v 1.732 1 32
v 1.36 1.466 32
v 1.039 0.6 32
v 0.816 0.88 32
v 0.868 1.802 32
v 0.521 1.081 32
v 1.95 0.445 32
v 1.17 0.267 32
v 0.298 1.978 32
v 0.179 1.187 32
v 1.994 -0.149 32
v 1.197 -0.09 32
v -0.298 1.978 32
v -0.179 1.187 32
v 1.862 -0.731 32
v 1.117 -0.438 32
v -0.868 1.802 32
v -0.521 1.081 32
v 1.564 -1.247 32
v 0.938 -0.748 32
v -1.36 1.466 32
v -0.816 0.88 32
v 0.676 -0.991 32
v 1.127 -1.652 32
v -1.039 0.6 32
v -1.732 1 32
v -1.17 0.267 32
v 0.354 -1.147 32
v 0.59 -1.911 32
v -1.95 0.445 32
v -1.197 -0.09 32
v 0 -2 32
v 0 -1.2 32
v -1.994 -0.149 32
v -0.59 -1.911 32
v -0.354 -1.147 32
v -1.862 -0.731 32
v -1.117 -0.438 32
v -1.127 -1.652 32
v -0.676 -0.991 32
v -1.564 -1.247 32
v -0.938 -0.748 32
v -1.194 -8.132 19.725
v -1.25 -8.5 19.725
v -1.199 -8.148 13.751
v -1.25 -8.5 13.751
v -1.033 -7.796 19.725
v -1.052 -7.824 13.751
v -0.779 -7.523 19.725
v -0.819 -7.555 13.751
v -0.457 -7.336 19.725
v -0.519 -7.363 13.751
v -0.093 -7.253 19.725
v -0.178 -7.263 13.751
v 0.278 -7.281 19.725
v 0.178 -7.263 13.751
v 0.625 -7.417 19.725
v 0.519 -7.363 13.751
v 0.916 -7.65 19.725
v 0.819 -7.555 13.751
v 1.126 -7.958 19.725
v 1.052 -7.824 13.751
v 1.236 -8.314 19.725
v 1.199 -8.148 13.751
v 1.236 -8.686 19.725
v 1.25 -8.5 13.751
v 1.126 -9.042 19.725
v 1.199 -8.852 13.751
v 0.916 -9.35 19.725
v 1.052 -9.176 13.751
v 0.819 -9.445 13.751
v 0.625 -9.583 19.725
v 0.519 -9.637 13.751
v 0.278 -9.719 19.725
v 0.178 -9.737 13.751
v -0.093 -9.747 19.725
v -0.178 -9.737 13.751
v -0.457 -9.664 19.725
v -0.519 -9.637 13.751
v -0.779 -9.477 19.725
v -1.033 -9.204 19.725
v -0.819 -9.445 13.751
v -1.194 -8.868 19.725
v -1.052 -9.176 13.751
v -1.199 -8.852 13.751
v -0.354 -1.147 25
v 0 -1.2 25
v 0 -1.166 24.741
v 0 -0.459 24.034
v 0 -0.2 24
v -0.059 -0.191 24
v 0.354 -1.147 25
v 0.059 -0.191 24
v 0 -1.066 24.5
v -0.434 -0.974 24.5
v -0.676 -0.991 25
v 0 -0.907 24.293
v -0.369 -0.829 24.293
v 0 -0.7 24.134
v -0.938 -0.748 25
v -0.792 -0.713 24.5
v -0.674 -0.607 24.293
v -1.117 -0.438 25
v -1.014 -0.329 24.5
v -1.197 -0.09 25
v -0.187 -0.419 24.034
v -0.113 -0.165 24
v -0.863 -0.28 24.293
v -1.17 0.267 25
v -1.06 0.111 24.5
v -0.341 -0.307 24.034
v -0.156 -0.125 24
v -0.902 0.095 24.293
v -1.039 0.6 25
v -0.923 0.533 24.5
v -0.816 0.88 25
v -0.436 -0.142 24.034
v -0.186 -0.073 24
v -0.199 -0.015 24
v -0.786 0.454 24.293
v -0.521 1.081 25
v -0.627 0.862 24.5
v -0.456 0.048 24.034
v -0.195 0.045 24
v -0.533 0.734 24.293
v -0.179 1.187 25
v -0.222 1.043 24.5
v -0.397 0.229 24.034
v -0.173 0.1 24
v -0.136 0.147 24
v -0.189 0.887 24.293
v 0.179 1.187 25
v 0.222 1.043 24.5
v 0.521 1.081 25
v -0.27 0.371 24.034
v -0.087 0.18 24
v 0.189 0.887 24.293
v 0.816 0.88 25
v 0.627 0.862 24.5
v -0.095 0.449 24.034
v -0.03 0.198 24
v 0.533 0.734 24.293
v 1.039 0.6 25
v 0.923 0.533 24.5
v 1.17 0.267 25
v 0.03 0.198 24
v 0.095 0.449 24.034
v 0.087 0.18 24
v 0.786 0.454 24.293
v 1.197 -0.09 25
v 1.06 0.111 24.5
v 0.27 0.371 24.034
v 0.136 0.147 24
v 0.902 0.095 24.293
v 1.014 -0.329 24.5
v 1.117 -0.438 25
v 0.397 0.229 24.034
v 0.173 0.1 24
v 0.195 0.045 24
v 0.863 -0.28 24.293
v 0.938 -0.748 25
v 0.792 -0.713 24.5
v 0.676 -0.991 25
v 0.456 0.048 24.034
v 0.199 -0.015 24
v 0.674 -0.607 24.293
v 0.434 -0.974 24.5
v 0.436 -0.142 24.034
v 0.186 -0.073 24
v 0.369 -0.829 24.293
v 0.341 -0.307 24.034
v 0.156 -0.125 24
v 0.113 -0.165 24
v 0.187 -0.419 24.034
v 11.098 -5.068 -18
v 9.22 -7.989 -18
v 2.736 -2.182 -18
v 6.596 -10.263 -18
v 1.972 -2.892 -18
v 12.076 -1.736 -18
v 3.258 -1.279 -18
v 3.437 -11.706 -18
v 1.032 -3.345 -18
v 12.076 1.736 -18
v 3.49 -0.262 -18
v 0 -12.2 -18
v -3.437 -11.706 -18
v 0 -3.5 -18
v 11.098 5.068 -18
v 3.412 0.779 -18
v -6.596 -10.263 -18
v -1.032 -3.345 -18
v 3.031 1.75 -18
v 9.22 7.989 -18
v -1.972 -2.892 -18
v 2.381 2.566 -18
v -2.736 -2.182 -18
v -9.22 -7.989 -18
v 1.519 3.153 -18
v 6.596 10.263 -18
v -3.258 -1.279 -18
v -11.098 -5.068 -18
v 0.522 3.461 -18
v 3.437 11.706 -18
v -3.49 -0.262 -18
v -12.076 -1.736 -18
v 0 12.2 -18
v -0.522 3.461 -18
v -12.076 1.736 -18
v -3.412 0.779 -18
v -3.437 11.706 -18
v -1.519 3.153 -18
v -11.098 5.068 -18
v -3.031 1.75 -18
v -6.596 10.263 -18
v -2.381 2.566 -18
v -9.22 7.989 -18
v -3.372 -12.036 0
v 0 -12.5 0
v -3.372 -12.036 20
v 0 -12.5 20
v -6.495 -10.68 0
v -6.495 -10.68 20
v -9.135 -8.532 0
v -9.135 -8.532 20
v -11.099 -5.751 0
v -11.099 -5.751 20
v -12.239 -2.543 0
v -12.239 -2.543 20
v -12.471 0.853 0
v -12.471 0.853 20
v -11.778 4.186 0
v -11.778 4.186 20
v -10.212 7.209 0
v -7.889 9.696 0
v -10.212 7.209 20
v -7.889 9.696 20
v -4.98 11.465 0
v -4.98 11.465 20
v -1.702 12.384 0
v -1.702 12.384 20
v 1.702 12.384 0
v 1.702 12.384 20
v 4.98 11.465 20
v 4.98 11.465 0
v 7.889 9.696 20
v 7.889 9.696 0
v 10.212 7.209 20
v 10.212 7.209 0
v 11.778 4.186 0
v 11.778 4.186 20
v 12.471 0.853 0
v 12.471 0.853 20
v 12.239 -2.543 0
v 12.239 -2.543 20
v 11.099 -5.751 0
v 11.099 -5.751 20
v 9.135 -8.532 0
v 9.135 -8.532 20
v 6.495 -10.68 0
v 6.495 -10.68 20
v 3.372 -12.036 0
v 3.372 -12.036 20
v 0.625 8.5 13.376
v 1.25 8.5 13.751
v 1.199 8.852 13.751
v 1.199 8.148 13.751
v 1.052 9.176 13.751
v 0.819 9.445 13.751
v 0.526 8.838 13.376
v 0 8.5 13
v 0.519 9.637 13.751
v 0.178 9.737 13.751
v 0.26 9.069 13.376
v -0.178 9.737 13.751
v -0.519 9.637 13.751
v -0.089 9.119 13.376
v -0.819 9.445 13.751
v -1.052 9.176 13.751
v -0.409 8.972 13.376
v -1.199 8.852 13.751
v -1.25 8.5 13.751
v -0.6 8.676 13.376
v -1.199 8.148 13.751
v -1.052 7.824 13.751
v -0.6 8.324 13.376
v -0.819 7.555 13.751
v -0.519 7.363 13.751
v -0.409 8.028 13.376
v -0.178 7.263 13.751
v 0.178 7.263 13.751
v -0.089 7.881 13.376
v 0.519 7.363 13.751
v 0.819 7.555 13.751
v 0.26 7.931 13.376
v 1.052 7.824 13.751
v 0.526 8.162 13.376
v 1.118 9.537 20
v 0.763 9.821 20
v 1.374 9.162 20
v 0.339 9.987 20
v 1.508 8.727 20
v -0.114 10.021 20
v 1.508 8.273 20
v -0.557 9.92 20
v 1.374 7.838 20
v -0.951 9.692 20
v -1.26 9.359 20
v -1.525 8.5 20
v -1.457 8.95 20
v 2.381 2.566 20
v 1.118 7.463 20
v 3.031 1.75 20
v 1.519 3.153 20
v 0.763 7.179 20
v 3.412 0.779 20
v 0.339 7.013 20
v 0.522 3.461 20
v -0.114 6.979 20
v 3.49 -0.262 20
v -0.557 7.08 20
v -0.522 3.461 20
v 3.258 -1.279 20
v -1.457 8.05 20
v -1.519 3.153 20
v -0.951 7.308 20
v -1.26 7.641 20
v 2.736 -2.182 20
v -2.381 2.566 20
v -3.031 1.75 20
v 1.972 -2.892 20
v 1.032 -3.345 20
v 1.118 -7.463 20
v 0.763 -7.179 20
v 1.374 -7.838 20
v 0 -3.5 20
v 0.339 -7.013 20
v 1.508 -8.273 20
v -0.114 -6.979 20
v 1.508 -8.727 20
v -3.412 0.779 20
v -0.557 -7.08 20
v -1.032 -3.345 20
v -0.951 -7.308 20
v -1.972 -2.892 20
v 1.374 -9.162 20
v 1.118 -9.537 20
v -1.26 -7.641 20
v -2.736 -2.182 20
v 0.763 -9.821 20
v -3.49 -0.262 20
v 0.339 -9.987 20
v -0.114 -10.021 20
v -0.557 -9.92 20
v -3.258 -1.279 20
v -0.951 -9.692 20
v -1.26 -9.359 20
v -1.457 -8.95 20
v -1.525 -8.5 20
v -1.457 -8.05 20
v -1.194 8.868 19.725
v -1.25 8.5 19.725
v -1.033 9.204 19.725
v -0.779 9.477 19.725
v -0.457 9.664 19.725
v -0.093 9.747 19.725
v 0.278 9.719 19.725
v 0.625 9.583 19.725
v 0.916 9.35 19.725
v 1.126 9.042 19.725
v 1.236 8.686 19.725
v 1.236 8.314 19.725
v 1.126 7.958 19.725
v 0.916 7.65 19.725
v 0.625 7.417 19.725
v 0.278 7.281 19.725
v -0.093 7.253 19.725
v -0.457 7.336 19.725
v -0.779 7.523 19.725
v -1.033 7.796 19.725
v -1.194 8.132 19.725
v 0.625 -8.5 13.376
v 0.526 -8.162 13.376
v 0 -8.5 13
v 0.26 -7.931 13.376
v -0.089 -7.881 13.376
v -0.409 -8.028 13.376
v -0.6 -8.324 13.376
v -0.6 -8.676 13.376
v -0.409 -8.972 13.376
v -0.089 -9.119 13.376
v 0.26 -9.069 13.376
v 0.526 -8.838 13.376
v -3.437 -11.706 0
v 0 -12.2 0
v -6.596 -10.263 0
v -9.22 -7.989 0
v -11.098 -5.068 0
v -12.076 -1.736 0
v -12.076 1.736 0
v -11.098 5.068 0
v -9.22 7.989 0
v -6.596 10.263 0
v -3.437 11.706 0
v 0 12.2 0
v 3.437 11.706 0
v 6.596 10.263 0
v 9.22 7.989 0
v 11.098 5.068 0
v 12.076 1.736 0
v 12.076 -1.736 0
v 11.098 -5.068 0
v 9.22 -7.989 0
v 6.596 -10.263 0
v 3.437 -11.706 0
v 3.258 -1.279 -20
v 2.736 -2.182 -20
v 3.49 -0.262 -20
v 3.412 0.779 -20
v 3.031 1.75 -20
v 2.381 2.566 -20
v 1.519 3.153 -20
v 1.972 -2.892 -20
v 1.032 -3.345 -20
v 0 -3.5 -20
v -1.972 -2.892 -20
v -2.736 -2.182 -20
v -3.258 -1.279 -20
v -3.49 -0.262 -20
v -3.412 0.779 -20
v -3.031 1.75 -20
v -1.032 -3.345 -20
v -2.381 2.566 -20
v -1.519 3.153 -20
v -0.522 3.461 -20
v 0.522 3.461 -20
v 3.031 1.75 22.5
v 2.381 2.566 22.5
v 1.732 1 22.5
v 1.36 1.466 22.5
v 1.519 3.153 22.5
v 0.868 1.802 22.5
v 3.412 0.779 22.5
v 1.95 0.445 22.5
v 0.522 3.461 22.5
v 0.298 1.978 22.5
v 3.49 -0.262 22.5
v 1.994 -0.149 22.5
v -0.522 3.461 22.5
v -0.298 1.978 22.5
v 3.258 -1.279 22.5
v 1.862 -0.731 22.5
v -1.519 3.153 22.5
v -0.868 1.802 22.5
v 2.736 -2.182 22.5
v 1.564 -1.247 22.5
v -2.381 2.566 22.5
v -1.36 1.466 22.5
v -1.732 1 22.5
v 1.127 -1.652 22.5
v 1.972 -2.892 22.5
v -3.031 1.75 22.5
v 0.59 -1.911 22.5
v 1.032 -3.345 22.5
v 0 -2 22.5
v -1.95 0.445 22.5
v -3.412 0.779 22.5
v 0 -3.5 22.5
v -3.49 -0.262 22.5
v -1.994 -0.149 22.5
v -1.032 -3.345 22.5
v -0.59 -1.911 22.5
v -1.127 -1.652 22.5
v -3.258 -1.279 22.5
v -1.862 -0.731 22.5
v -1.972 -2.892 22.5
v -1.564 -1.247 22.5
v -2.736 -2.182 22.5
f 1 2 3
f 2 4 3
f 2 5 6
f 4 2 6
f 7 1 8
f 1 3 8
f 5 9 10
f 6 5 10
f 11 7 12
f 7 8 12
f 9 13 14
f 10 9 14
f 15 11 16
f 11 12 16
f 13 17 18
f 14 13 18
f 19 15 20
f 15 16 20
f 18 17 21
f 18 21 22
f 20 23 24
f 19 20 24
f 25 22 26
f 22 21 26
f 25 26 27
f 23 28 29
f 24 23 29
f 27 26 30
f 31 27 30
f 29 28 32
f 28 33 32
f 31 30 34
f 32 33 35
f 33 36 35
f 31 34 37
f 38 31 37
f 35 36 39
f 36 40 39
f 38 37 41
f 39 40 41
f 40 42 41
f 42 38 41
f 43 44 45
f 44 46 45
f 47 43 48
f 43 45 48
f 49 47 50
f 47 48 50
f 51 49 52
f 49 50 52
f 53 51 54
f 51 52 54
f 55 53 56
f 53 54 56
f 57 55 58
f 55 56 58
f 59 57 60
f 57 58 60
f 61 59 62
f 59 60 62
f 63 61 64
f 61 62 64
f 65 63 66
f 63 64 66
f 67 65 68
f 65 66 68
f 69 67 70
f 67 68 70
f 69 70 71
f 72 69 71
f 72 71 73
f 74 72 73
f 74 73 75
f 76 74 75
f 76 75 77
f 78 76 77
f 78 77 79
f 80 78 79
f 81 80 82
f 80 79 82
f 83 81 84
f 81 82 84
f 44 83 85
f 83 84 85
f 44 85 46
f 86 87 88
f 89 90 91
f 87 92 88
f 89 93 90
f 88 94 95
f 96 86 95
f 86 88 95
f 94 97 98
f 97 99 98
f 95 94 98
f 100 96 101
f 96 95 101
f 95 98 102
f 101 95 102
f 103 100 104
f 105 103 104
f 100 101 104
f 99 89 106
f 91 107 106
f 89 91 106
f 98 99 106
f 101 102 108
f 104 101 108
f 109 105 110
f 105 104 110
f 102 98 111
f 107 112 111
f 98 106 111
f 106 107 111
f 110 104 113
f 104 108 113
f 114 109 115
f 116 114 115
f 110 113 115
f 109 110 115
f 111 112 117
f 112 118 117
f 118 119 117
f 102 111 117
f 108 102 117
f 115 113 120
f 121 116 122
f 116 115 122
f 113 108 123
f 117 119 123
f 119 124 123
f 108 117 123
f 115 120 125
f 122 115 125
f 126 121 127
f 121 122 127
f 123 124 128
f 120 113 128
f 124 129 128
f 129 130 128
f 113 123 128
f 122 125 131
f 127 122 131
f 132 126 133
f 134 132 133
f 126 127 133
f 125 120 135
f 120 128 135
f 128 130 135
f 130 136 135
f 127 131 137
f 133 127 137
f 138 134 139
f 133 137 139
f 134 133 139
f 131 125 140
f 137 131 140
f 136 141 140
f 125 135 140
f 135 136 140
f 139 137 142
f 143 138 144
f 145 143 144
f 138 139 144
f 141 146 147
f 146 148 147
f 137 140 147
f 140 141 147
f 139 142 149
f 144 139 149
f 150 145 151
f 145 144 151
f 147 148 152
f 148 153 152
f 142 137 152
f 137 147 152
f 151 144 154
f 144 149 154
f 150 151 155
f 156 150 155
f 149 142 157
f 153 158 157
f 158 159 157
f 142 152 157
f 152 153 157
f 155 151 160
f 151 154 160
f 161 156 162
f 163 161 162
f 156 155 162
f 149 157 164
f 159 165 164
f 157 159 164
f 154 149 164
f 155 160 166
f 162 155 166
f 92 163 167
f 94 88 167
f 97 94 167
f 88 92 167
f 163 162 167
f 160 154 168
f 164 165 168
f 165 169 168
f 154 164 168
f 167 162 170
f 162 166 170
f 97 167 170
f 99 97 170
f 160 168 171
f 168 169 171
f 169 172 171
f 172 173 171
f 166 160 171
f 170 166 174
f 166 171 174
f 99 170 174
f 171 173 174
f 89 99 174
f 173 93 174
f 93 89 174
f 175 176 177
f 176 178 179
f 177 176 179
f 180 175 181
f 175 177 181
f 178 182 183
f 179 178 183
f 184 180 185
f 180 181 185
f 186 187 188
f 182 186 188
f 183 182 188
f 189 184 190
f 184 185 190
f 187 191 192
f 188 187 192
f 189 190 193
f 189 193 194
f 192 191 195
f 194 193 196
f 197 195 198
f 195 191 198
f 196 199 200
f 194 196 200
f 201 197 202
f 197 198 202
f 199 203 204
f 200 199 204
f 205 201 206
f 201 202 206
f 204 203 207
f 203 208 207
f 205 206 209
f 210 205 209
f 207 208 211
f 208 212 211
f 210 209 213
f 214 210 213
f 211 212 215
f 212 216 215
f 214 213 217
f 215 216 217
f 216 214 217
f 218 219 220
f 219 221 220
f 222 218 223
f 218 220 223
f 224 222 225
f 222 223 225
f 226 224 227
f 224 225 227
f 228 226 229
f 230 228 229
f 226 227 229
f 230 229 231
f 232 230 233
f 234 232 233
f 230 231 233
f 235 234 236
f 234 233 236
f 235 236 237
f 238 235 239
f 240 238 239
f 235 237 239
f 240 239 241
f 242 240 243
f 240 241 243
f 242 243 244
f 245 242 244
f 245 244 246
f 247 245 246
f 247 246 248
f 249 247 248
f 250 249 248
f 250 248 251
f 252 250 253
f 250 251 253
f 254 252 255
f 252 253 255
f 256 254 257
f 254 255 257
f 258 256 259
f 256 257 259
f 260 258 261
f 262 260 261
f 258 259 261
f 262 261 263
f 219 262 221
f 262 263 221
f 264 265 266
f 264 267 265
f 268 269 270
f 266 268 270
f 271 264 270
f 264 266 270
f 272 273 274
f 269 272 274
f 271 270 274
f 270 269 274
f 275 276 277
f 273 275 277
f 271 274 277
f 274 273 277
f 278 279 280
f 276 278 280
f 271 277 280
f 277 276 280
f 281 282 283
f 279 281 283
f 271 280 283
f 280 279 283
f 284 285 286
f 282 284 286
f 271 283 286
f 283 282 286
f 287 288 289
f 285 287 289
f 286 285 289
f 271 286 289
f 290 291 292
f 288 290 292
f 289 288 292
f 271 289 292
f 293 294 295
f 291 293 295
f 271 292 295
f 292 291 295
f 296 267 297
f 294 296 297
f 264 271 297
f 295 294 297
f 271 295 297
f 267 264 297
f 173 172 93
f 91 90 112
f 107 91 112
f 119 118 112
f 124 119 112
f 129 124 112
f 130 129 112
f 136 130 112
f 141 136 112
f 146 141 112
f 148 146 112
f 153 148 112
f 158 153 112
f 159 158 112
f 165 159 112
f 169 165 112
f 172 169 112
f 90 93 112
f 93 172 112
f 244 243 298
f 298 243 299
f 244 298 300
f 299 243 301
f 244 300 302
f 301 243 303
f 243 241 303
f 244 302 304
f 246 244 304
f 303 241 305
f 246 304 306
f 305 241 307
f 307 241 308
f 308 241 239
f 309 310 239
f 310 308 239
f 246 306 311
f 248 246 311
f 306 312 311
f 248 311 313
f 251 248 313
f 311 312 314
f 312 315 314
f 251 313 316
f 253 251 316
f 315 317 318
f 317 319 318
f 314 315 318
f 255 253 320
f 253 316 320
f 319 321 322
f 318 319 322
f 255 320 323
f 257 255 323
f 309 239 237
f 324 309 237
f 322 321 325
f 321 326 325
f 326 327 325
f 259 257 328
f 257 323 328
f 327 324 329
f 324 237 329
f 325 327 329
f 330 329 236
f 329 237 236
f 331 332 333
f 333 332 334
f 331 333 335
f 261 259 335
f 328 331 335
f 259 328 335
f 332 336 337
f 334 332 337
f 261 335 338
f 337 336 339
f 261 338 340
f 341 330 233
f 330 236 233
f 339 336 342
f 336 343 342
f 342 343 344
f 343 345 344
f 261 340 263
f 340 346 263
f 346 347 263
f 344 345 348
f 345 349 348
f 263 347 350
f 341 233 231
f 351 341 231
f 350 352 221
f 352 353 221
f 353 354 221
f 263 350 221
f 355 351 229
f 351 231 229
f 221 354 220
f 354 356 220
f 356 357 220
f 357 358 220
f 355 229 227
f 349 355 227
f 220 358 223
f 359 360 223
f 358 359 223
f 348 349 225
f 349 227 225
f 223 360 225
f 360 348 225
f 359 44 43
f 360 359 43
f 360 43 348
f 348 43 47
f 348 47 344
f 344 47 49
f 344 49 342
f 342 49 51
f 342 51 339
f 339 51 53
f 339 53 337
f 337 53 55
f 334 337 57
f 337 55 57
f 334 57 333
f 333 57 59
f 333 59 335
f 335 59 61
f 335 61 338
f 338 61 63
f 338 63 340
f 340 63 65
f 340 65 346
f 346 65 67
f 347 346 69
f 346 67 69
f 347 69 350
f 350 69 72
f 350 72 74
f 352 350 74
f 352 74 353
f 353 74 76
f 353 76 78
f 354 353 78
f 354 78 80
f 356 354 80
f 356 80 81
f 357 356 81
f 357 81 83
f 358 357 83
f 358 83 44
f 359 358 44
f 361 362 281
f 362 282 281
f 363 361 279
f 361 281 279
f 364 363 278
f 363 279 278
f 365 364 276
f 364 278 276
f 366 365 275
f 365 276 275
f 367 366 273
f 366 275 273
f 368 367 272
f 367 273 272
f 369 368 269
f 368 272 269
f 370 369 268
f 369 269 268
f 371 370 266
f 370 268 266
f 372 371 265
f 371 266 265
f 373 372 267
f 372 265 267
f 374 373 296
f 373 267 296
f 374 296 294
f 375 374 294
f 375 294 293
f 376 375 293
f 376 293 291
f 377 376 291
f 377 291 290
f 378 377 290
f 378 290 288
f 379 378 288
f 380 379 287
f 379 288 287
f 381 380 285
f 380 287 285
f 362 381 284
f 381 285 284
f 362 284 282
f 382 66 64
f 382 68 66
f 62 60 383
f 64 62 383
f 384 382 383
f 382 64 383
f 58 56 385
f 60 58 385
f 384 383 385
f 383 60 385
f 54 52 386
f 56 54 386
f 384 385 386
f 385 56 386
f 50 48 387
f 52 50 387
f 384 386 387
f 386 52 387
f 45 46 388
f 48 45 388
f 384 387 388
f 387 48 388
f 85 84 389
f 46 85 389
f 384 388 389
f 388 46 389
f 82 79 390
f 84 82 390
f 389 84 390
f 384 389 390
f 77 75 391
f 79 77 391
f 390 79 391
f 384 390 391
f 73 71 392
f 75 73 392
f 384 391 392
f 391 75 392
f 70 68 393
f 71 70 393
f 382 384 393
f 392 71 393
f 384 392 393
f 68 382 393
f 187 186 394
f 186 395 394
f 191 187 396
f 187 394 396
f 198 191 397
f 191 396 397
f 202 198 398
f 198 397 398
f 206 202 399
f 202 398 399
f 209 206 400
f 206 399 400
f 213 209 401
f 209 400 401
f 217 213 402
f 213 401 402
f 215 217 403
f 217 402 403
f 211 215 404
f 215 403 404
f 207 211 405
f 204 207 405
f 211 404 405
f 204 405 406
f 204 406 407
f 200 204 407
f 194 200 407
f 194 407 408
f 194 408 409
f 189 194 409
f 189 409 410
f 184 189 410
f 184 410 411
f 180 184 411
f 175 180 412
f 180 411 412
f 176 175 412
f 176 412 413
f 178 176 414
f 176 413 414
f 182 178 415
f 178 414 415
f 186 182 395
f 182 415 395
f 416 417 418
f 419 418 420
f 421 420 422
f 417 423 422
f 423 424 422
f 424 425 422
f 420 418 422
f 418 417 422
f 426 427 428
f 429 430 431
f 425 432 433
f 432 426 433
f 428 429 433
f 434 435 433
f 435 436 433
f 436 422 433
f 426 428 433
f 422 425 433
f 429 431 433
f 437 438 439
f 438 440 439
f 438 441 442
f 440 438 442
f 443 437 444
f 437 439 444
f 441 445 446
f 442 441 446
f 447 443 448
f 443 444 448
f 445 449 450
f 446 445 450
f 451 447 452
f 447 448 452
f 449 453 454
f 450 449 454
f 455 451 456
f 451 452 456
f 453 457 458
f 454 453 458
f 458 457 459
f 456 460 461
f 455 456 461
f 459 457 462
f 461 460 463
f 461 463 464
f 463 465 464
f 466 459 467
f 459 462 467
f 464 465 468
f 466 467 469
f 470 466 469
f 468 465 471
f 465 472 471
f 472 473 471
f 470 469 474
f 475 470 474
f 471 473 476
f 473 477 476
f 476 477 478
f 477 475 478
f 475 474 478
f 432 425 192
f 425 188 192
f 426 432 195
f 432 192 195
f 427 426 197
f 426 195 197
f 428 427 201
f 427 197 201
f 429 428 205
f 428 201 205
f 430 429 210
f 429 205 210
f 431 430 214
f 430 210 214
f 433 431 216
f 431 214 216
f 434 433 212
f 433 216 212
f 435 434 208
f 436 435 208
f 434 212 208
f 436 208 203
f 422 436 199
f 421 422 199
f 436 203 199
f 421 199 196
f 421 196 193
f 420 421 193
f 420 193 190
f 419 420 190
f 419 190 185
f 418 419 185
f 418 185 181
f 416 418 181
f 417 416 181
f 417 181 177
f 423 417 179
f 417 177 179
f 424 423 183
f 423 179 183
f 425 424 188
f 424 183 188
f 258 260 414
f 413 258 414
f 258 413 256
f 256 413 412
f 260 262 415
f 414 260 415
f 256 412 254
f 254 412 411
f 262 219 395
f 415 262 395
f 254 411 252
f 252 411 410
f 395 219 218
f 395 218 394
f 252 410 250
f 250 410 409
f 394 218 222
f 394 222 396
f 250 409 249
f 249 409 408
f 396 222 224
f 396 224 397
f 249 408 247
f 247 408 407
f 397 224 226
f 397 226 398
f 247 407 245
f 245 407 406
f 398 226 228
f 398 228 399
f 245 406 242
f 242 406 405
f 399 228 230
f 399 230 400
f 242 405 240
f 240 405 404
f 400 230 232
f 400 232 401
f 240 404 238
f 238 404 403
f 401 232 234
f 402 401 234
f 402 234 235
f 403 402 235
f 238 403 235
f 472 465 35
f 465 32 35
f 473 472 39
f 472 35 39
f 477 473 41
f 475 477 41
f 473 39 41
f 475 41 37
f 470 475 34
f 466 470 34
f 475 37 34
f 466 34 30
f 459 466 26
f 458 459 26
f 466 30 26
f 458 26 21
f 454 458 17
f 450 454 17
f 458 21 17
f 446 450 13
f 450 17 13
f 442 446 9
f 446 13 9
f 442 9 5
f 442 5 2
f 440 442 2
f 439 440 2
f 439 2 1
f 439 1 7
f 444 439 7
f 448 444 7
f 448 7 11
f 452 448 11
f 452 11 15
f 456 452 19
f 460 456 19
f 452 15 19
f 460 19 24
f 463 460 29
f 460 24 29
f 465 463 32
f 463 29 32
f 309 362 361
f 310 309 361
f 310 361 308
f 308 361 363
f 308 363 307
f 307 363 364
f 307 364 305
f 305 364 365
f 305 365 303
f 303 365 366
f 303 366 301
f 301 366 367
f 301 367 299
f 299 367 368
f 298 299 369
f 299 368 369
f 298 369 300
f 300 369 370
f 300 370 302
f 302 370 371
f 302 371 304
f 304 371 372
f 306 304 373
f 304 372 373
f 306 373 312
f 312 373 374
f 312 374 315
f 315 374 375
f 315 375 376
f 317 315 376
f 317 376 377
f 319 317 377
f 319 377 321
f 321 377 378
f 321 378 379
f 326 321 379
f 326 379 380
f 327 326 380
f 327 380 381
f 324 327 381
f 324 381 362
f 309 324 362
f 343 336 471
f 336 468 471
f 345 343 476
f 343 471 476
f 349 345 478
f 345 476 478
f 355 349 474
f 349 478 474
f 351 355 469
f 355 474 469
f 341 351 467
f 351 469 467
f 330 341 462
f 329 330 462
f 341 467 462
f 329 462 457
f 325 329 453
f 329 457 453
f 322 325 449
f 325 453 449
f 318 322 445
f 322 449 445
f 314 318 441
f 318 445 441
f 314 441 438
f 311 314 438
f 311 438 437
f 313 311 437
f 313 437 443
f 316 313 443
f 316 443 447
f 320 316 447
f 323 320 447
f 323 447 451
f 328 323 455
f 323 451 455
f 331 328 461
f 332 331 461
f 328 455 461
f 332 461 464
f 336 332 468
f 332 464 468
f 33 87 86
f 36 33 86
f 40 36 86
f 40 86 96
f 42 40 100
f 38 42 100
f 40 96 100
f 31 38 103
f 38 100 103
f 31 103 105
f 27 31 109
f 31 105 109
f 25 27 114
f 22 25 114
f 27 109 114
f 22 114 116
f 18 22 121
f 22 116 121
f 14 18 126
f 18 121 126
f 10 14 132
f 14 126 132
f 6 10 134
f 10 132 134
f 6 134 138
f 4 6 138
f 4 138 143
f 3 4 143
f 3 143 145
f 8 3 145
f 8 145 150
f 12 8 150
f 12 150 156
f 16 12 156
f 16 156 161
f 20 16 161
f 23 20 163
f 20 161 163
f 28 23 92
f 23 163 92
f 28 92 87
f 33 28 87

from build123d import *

# Parameters (mm, degrees)
M3X0_5_TAPPED_HOLE1_D           = 2.5
M3X0_5_TAPPED_HOLE1_DEPTH       = 6.248924226
M3X0_5_TAPPED_HOLE1_CSINK_D     = 3.05
M3X0_5_TAPPED_HOLE1_CSINK_ANGLE = 90
M3X0_5_TAPPED_HOLE1_TIP         = 0.751075774
FILLET1_R                       = 1


with BuildPart() as part:
    # Sketch1 → Revolve1 (revolve)
    with BuildSketch(Plane(origin=(0, 0, 0), x_dir=(0, 0, -1), z_dir=(1, 0, 0)), mode=Mode.PRIVATE) as revolve1_sk:
        Polygon((20, 0), (20, 3.5), (18, 3.5), (18, 12.2), (0, 12.2), (0, 12.5), (-20, 12.5), (-20, 3.5), (-22.5, 3.5), (-22.5, 2), (-32, 2), (-32, 1.2), (-24, 1.2), (-24, 0), align=None)
    revolve(revolve1_sk.sketch.rotate(Axis((0, 0, 0), (0, 0, -1)), 180), axis=Axis((0, 0, 0), (0, 0, -1)))

    # M3x0.5 Tapped Hole1
    with Locations(Plane.XY.offset(20)):
        with Locations((0, 8.5), (0, -8.5)):
            CounterSinkHole(M3X0_5_TAPPED_HOLE1_D / 2, M3X0_5_TAPPED_HOLE1_CSINK_D / 2, depth=M3X0_5_TAPPED_HOLE1_DEPTH, counter_sink_angle=M3X0_5_TAPPED_HOLE1_CSINK_ANGLE)
            with Locations((0, 0, -(M3X0_5_TAPPED_HOLE1_DEPTH + M3X0_5_TAPPED_HOLE1_TIP / 2))):  # 118° drill point
                Cone(0, M3X0_5_TAPPED_HOLE1_D / 2, M3X0_5_TAPPED_HOLE1_TIP, mode=Mode.SUBTRACT)

    # Fillet1
    fillet1_edges = [part.edges().sort_by_distance(p)[0] for p in [
        (0, 1.2, 24),
    ]]
    fillet(fillet1_edges, radius=FILLET1_R)


solid = part.part
